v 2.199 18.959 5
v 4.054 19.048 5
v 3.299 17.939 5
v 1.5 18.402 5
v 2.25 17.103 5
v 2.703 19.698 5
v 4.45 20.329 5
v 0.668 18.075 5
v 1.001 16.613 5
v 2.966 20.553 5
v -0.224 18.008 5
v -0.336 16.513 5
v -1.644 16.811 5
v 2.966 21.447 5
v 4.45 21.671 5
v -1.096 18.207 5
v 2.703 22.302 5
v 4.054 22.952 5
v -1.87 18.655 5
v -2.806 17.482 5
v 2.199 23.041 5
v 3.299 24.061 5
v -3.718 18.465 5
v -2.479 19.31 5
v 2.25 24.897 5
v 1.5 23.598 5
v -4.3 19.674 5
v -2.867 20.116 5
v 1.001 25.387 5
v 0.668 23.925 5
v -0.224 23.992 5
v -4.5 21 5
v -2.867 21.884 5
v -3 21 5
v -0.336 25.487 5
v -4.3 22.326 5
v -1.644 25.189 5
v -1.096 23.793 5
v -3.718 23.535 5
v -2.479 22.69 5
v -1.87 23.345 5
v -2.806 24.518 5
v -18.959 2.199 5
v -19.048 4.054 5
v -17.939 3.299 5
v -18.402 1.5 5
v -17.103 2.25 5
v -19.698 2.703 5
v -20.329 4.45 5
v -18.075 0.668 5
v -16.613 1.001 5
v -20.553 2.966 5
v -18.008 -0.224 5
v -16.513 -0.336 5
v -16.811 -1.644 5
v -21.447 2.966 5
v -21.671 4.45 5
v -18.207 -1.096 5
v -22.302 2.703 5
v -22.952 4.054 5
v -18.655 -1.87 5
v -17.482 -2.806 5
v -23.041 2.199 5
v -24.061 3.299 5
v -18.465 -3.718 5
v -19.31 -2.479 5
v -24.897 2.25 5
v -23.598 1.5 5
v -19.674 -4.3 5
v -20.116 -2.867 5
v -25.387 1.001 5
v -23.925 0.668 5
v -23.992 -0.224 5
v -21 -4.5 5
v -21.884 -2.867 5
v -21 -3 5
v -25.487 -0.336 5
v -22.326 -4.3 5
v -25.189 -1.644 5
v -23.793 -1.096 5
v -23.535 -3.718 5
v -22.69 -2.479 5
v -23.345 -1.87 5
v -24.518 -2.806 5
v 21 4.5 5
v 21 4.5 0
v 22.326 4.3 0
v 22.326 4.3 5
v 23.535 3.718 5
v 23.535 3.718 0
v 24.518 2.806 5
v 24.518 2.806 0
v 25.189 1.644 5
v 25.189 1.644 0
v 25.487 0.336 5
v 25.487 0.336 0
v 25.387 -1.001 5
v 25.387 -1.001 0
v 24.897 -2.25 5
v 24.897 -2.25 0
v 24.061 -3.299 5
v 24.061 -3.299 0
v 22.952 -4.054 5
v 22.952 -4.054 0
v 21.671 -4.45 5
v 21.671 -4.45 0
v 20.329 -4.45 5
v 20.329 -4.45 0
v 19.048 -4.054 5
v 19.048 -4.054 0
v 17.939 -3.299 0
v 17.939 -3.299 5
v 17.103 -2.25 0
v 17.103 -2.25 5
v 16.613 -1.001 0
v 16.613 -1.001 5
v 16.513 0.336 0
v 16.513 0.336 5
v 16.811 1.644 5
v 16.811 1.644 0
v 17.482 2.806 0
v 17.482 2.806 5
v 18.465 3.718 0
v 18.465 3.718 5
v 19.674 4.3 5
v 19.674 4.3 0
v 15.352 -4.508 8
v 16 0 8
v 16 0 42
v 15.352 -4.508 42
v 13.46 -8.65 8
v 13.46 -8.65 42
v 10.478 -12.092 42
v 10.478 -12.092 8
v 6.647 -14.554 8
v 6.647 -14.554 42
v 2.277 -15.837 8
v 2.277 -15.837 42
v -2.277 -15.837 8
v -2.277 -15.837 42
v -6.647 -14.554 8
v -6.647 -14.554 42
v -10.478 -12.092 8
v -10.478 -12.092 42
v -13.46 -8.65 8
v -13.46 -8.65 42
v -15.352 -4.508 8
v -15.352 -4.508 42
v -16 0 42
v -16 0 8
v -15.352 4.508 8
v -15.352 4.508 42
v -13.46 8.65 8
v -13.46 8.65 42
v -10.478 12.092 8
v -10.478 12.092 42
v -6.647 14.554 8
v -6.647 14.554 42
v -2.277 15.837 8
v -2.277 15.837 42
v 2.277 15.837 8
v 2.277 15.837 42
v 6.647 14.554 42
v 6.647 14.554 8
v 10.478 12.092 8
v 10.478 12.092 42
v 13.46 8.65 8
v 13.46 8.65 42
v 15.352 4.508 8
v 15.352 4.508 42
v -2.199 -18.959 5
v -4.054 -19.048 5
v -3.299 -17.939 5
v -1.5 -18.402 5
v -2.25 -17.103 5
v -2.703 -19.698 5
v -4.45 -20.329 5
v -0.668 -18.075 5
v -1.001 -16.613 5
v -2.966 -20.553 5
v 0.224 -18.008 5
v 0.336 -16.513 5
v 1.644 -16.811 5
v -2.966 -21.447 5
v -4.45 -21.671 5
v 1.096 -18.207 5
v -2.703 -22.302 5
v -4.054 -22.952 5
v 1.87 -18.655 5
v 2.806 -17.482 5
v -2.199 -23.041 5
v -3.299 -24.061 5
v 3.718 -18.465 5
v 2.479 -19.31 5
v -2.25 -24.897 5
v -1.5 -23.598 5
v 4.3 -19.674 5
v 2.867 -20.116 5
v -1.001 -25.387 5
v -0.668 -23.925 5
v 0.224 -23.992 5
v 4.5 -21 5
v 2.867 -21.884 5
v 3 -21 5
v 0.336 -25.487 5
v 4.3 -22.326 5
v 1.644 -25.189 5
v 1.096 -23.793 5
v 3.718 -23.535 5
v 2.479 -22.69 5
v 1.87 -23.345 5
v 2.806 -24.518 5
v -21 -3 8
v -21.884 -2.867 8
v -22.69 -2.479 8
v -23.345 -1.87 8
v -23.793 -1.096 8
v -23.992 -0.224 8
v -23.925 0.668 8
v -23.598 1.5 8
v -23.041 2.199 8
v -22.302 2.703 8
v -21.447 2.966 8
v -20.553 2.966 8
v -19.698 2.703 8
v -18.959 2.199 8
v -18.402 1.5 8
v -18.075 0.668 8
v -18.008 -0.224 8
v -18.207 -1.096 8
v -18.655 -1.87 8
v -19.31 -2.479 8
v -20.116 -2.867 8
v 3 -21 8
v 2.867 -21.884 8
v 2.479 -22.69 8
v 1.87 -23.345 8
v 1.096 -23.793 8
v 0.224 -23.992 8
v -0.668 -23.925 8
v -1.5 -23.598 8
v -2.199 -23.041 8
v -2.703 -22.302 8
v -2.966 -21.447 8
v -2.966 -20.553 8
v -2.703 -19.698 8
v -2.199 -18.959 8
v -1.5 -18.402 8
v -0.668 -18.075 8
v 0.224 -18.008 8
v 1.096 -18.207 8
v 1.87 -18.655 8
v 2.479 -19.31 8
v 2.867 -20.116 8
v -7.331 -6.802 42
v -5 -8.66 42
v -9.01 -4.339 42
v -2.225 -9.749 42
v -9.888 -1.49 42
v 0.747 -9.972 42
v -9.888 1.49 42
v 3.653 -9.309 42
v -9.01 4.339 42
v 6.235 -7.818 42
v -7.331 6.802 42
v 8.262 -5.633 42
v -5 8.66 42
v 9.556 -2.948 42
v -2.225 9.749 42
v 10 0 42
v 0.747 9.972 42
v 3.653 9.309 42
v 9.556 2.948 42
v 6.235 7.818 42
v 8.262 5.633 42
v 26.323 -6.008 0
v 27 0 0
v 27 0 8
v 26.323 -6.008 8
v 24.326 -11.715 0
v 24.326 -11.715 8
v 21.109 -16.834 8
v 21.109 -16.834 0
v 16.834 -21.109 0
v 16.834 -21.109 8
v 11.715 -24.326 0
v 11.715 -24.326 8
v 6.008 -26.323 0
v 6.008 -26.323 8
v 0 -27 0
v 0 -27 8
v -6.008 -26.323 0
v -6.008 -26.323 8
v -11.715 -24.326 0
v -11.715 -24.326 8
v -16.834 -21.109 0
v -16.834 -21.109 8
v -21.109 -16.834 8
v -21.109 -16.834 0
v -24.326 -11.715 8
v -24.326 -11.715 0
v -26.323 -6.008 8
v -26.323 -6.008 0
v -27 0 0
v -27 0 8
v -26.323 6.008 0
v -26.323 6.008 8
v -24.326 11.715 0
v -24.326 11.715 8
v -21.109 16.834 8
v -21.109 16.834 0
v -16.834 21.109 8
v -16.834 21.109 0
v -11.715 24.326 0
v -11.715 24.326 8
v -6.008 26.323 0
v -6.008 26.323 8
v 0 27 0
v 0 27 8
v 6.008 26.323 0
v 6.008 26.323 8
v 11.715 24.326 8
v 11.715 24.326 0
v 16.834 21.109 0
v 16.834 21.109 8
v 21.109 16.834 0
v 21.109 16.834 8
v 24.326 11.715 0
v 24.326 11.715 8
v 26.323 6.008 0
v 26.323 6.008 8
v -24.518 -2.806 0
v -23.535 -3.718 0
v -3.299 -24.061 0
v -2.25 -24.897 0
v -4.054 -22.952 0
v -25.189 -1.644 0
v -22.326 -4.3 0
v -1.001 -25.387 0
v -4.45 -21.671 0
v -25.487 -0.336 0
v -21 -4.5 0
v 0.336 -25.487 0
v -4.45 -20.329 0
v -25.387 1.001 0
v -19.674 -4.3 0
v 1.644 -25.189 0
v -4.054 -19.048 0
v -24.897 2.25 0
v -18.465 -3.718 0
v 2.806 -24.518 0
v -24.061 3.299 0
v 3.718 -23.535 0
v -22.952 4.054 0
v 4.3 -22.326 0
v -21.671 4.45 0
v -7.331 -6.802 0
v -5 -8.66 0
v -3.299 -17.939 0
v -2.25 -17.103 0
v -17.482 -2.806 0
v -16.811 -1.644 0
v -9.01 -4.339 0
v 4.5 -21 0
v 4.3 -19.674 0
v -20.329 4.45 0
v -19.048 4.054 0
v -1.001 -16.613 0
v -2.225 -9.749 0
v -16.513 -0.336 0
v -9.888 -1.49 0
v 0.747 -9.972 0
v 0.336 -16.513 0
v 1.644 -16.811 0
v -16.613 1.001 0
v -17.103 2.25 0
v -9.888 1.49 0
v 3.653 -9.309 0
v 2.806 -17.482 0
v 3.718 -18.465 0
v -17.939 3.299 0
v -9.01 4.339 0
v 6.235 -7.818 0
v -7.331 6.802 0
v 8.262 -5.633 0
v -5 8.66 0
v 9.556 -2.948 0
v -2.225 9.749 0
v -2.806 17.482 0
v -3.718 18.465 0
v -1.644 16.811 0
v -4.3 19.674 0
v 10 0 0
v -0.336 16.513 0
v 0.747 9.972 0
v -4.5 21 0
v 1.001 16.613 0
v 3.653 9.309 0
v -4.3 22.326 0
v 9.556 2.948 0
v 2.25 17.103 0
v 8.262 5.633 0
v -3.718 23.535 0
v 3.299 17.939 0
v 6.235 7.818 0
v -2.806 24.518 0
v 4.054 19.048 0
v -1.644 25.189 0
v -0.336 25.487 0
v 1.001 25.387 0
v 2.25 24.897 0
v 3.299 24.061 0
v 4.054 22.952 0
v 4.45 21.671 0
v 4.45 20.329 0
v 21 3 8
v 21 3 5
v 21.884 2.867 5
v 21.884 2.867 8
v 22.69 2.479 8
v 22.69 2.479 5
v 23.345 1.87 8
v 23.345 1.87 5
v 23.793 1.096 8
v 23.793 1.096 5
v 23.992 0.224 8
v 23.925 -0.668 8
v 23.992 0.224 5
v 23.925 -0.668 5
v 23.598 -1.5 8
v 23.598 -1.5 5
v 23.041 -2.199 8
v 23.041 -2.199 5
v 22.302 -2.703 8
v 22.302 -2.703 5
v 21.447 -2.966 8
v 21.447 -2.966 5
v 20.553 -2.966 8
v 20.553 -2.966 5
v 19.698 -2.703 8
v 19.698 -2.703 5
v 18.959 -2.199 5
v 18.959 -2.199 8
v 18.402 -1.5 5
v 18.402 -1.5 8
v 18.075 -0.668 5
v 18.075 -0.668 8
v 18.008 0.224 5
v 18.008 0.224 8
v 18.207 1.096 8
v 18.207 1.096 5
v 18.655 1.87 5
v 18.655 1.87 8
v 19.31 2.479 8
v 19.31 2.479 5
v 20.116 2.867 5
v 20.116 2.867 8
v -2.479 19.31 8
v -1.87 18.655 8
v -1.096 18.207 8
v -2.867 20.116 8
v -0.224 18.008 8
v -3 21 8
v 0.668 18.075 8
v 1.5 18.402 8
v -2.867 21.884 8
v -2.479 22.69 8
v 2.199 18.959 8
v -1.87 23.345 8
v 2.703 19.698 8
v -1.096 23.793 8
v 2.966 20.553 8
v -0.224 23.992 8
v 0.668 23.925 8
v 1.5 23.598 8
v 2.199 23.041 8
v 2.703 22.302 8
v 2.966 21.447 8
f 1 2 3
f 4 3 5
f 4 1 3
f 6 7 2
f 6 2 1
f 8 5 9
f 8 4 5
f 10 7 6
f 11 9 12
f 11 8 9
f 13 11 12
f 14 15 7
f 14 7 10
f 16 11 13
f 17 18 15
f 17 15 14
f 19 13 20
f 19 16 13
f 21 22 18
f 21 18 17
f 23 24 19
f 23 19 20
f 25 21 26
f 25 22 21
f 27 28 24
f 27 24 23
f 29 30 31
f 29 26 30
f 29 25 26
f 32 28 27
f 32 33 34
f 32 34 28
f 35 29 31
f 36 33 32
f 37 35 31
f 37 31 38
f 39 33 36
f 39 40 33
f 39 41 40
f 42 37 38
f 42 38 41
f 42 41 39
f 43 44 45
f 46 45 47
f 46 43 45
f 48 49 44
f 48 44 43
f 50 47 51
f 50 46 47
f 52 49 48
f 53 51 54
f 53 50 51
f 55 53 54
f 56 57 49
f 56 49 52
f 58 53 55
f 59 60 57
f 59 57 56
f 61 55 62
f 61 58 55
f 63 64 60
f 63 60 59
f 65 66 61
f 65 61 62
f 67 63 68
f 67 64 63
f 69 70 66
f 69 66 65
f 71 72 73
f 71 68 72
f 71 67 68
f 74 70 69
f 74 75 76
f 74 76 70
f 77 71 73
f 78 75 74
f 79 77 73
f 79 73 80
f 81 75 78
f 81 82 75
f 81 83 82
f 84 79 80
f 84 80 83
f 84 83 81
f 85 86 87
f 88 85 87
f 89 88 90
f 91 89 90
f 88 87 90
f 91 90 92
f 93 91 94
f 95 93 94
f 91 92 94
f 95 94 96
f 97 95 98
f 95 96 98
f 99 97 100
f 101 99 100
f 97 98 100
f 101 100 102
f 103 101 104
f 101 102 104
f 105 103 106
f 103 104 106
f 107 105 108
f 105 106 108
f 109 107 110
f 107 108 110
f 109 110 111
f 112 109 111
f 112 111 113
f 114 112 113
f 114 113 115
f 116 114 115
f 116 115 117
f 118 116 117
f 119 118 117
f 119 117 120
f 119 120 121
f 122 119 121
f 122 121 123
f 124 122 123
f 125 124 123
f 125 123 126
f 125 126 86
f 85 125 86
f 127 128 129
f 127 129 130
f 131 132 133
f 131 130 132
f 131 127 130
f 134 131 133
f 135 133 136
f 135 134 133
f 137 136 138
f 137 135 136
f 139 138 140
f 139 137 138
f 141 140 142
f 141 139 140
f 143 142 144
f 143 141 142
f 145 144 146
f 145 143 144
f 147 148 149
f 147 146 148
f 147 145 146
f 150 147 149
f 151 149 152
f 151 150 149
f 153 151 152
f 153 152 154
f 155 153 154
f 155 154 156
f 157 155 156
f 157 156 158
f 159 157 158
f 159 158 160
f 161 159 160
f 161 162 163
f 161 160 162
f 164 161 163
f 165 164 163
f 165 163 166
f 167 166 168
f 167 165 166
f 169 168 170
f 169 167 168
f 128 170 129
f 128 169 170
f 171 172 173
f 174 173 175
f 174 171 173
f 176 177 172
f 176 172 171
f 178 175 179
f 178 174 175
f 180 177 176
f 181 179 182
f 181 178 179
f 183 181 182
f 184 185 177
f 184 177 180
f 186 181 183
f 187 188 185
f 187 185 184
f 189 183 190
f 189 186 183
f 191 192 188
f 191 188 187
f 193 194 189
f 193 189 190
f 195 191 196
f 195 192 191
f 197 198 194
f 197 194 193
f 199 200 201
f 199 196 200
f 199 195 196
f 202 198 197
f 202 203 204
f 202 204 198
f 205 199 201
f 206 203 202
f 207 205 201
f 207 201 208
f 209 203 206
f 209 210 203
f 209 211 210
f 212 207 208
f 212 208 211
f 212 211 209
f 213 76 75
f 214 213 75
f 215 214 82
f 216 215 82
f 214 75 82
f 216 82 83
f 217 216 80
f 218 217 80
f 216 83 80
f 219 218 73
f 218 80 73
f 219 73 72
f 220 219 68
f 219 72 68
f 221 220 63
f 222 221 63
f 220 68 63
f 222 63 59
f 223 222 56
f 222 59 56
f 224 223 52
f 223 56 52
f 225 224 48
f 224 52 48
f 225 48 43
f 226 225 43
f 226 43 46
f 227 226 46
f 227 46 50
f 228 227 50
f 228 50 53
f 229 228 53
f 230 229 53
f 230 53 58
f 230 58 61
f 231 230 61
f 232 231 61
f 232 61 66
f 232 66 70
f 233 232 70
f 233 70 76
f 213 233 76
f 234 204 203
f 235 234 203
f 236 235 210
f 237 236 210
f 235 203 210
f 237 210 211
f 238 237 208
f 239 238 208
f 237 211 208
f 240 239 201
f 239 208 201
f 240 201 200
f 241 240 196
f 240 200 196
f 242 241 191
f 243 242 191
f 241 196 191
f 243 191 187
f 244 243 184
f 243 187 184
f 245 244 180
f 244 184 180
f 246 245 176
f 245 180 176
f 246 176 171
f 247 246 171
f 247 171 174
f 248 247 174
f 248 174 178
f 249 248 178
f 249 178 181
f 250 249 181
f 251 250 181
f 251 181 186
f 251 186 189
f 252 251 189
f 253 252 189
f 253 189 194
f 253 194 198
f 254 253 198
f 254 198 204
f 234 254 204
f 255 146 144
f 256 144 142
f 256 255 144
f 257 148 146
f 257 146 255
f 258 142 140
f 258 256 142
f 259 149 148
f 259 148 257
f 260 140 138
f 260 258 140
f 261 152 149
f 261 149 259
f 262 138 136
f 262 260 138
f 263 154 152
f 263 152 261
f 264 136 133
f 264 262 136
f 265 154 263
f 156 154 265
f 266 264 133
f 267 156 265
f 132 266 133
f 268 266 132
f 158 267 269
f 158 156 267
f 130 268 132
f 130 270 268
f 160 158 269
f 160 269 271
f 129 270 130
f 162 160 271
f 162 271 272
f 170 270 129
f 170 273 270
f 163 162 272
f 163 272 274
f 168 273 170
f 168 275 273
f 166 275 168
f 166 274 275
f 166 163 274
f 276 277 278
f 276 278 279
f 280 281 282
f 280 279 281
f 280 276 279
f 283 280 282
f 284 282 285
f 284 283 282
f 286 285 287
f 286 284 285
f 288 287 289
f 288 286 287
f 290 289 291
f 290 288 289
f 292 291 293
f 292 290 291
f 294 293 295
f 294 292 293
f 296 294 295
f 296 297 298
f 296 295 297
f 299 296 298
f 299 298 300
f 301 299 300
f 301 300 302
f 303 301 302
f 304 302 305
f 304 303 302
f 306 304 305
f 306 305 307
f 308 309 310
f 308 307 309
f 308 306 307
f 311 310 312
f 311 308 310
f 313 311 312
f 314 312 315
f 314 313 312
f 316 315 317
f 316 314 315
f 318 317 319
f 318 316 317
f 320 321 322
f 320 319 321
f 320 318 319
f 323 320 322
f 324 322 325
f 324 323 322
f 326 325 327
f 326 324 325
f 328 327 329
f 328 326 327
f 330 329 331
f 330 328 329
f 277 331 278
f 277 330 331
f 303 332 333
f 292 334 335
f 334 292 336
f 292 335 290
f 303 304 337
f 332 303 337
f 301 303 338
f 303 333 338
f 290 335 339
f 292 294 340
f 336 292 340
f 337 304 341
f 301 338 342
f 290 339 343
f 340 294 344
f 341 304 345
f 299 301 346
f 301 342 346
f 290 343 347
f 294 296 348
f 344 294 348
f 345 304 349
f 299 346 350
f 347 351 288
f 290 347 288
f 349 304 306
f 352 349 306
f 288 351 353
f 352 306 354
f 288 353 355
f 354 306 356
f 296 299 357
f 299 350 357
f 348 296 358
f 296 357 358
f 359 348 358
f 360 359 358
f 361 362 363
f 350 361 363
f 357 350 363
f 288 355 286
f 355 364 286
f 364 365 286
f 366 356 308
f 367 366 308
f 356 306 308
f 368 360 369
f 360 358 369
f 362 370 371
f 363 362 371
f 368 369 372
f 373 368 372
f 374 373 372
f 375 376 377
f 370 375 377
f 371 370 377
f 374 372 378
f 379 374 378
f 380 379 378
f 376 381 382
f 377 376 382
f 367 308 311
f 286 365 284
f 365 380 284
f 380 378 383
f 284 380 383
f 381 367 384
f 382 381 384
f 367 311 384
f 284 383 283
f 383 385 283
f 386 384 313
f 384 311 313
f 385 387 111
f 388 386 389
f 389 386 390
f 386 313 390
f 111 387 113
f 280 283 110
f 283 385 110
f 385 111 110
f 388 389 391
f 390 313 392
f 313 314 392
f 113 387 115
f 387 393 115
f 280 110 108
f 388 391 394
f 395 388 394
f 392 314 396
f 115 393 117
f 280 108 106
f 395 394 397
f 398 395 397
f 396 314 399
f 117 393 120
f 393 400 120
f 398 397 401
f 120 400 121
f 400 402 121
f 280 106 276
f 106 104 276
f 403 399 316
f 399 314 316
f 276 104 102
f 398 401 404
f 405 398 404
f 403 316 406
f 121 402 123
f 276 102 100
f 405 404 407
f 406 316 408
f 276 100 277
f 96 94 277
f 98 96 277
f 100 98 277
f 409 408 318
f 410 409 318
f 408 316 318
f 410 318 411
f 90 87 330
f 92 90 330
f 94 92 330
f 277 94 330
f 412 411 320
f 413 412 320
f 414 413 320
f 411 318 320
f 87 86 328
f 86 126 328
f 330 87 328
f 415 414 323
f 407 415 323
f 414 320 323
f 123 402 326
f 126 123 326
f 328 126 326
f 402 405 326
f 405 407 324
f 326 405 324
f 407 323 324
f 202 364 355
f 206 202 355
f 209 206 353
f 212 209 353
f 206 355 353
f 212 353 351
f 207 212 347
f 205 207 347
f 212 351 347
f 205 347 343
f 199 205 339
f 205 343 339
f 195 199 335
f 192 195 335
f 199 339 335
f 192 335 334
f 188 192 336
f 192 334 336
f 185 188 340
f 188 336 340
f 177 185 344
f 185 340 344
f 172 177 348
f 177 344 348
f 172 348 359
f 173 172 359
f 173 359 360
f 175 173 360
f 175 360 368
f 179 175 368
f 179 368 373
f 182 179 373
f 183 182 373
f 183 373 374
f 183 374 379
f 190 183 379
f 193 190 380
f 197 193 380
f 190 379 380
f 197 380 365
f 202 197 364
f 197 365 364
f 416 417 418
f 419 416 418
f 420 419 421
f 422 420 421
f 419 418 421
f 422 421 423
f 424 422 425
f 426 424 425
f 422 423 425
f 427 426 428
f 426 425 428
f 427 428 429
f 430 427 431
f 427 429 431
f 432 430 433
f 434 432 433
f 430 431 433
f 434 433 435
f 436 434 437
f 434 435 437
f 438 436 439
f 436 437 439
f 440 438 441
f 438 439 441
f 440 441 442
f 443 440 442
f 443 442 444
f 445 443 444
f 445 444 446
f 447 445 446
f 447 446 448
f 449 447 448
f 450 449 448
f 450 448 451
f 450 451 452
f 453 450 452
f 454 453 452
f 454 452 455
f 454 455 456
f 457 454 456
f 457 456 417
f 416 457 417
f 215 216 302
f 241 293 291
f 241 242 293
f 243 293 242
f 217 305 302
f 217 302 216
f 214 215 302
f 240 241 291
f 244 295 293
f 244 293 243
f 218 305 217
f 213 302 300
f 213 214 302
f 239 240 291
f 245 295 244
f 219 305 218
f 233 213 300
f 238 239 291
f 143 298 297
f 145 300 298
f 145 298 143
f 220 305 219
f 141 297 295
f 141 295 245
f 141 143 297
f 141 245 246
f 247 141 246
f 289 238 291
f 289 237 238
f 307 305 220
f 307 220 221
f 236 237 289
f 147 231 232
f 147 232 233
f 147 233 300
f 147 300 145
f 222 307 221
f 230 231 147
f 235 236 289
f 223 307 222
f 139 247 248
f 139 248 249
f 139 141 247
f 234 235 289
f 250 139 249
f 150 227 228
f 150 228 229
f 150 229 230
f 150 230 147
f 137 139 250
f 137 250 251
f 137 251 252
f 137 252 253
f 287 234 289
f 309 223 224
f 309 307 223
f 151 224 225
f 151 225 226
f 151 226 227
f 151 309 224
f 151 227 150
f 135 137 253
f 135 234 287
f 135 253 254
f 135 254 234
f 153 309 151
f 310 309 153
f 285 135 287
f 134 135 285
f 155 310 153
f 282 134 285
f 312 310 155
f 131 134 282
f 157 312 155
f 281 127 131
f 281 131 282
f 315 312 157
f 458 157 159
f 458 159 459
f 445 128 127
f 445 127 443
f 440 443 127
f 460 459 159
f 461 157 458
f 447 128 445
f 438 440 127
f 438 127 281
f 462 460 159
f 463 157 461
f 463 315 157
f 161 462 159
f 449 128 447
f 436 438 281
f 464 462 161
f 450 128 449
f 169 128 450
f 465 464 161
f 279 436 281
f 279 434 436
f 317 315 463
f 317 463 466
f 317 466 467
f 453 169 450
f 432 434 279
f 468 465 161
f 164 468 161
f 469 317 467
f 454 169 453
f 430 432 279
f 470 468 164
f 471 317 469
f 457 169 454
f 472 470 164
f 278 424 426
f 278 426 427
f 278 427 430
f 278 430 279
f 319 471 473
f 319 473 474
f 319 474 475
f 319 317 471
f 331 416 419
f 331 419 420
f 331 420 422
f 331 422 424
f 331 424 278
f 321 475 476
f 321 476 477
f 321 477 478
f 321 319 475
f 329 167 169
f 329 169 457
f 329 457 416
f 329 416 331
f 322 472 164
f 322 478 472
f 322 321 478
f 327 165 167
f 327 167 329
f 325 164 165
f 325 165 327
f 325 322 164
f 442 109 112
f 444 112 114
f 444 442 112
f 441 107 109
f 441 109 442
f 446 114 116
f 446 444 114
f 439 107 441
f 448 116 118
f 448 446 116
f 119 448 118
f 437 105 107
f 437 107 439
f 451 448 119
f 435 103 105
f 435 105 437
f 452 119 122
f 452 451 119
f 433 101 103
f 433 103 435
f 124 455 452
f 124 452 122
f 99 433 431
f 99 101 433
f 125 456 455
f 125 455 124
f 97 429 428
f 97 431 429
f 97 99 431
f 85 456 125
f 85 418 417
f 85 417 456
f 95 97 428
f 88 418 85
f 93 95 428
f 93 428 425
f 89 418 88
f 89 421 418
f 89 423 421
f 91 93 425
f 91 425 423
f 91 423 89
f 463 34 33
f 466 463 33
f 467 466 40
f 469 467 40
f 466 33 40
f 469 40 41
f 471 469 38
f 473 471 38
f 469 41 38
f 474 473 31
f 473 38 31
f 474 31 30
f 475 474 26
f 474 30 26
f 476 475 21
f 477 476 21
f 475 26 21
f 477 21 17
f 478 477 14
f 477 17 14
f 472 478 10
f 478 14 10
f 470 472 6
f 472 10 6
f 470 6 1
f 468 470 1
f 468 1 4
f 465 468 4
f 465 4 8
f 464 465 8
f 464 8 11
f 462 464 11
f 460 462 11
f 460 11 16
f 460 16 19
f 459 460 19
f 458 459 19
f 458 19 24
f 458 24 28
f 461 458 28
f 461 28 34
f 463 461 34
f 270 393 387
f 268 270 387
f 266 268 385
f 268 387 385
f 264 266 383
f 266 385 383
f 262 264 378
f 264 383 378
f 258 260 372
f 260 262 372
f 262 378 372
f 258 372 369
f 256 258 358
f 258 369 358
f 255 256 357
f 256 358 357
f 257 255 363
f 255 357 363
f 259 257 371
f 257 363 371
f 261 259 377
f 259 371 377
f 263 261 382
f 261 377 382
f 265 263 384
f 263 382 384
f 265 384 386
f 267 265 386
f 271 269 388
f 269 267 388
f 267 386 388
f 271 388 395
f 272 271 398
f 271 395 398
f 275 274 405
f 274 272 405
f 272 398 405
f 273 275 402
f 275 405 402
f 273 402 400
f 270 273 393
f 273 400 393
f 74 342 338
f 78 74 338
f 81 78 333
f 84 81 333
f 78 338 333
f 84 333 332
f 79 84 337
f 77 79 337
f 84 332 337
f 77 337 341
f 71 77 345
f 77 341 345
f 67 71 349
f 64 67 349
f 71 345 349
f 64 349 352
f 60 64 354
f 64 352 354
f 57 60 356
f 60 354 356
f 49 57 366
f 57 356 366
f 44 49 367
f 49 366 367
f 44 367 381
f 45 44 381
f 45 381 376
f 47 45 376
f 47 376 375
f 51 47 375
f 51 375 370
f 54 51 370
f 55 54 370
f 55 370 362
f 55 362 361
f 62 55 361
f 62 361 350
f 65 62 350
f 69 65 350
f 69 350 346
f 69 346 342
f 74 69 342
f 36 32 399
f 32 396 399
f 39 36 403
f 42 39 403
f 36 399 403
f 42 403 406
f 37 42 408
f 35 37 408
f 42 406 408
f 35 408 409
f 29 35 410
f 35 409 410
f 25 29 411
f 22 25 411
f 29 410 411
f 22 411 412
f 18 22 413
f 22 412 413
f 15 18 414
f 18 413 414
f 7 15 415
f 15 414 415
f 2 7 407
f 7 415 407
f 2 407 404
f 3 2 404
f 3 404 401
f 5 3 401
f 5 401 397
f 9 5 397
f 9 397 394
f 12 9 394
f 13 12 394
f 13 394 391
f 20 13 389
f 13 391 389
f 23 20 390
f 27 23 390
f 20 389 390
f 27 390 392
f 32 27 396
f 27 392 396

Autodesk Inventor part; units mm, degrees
ref_plane "YZ Plane" through (0, 0, 0) normal (1, 0, 0) x (0, 1, 0)
ref_plane "XZ Plane" through (0, 0, 0) normal (0, 1, 0) x (-1, 0, 0)
ref_plane "XY Plane" through (0, 0, 0) normal (0, 0, 1) x (1, 0, 0)
sketch "Sketch1" plane through (0, 0, 0) normal (0, 0, 1) x (1, 0, 0)
  circle A0 centre (0, 0) radius 27
  circle A1 centre (0, 0) radius 10
  dimension "d0" = 54
  dimension "d1" = 20
extrude "Extrusion1" add sketch "Sketch1" along normal blind 8
sketch "Sketch2" plane through (0, 0, 8) normal (0, 0, 1) x (1, 0, 0)
  circle A0 centre (0, 0) radius 10 projected
  circle A1 centre (0, 0) radius 16
  dimension "d4" = 32
extrude "Extrusion2" add sketch "Sketch2" along normal blind 34
sketch "Sketch3" plane through (0, 0, 0) normal (0, 0, -1) x (-1, 0, 0)
  circle A0 centre (0, 0) radius 21 construction
  circle A1 centre (0, 21) radius 4.5
  dimension "d7" = 42
  dimension "d8" = 9
extrude "Extrusion3" cut sketch "Sketch3" against normal blind 5
sketch "Sketch4" plane through (0, 21, 5) normal (0, 0, -1) x (-1, 0, 0)
  circle A0 centre (0, 0) radius 4.5 projected
  circle A1 centre (0, 0) radius 3
  point P0 (0, -21)
  dimension "d11" = 6
extrude "Extrusion4" cut sketch "Sketch4" against normal through all contours A1
pattern_circular "Circular Pattern1" count 4 over 360 about axis through (0, 0, 0) along (0, 0, 1) of "Extrusion4", "Extrusion3"
properties part number "LMF20UU" material "Aluminum 6061"
